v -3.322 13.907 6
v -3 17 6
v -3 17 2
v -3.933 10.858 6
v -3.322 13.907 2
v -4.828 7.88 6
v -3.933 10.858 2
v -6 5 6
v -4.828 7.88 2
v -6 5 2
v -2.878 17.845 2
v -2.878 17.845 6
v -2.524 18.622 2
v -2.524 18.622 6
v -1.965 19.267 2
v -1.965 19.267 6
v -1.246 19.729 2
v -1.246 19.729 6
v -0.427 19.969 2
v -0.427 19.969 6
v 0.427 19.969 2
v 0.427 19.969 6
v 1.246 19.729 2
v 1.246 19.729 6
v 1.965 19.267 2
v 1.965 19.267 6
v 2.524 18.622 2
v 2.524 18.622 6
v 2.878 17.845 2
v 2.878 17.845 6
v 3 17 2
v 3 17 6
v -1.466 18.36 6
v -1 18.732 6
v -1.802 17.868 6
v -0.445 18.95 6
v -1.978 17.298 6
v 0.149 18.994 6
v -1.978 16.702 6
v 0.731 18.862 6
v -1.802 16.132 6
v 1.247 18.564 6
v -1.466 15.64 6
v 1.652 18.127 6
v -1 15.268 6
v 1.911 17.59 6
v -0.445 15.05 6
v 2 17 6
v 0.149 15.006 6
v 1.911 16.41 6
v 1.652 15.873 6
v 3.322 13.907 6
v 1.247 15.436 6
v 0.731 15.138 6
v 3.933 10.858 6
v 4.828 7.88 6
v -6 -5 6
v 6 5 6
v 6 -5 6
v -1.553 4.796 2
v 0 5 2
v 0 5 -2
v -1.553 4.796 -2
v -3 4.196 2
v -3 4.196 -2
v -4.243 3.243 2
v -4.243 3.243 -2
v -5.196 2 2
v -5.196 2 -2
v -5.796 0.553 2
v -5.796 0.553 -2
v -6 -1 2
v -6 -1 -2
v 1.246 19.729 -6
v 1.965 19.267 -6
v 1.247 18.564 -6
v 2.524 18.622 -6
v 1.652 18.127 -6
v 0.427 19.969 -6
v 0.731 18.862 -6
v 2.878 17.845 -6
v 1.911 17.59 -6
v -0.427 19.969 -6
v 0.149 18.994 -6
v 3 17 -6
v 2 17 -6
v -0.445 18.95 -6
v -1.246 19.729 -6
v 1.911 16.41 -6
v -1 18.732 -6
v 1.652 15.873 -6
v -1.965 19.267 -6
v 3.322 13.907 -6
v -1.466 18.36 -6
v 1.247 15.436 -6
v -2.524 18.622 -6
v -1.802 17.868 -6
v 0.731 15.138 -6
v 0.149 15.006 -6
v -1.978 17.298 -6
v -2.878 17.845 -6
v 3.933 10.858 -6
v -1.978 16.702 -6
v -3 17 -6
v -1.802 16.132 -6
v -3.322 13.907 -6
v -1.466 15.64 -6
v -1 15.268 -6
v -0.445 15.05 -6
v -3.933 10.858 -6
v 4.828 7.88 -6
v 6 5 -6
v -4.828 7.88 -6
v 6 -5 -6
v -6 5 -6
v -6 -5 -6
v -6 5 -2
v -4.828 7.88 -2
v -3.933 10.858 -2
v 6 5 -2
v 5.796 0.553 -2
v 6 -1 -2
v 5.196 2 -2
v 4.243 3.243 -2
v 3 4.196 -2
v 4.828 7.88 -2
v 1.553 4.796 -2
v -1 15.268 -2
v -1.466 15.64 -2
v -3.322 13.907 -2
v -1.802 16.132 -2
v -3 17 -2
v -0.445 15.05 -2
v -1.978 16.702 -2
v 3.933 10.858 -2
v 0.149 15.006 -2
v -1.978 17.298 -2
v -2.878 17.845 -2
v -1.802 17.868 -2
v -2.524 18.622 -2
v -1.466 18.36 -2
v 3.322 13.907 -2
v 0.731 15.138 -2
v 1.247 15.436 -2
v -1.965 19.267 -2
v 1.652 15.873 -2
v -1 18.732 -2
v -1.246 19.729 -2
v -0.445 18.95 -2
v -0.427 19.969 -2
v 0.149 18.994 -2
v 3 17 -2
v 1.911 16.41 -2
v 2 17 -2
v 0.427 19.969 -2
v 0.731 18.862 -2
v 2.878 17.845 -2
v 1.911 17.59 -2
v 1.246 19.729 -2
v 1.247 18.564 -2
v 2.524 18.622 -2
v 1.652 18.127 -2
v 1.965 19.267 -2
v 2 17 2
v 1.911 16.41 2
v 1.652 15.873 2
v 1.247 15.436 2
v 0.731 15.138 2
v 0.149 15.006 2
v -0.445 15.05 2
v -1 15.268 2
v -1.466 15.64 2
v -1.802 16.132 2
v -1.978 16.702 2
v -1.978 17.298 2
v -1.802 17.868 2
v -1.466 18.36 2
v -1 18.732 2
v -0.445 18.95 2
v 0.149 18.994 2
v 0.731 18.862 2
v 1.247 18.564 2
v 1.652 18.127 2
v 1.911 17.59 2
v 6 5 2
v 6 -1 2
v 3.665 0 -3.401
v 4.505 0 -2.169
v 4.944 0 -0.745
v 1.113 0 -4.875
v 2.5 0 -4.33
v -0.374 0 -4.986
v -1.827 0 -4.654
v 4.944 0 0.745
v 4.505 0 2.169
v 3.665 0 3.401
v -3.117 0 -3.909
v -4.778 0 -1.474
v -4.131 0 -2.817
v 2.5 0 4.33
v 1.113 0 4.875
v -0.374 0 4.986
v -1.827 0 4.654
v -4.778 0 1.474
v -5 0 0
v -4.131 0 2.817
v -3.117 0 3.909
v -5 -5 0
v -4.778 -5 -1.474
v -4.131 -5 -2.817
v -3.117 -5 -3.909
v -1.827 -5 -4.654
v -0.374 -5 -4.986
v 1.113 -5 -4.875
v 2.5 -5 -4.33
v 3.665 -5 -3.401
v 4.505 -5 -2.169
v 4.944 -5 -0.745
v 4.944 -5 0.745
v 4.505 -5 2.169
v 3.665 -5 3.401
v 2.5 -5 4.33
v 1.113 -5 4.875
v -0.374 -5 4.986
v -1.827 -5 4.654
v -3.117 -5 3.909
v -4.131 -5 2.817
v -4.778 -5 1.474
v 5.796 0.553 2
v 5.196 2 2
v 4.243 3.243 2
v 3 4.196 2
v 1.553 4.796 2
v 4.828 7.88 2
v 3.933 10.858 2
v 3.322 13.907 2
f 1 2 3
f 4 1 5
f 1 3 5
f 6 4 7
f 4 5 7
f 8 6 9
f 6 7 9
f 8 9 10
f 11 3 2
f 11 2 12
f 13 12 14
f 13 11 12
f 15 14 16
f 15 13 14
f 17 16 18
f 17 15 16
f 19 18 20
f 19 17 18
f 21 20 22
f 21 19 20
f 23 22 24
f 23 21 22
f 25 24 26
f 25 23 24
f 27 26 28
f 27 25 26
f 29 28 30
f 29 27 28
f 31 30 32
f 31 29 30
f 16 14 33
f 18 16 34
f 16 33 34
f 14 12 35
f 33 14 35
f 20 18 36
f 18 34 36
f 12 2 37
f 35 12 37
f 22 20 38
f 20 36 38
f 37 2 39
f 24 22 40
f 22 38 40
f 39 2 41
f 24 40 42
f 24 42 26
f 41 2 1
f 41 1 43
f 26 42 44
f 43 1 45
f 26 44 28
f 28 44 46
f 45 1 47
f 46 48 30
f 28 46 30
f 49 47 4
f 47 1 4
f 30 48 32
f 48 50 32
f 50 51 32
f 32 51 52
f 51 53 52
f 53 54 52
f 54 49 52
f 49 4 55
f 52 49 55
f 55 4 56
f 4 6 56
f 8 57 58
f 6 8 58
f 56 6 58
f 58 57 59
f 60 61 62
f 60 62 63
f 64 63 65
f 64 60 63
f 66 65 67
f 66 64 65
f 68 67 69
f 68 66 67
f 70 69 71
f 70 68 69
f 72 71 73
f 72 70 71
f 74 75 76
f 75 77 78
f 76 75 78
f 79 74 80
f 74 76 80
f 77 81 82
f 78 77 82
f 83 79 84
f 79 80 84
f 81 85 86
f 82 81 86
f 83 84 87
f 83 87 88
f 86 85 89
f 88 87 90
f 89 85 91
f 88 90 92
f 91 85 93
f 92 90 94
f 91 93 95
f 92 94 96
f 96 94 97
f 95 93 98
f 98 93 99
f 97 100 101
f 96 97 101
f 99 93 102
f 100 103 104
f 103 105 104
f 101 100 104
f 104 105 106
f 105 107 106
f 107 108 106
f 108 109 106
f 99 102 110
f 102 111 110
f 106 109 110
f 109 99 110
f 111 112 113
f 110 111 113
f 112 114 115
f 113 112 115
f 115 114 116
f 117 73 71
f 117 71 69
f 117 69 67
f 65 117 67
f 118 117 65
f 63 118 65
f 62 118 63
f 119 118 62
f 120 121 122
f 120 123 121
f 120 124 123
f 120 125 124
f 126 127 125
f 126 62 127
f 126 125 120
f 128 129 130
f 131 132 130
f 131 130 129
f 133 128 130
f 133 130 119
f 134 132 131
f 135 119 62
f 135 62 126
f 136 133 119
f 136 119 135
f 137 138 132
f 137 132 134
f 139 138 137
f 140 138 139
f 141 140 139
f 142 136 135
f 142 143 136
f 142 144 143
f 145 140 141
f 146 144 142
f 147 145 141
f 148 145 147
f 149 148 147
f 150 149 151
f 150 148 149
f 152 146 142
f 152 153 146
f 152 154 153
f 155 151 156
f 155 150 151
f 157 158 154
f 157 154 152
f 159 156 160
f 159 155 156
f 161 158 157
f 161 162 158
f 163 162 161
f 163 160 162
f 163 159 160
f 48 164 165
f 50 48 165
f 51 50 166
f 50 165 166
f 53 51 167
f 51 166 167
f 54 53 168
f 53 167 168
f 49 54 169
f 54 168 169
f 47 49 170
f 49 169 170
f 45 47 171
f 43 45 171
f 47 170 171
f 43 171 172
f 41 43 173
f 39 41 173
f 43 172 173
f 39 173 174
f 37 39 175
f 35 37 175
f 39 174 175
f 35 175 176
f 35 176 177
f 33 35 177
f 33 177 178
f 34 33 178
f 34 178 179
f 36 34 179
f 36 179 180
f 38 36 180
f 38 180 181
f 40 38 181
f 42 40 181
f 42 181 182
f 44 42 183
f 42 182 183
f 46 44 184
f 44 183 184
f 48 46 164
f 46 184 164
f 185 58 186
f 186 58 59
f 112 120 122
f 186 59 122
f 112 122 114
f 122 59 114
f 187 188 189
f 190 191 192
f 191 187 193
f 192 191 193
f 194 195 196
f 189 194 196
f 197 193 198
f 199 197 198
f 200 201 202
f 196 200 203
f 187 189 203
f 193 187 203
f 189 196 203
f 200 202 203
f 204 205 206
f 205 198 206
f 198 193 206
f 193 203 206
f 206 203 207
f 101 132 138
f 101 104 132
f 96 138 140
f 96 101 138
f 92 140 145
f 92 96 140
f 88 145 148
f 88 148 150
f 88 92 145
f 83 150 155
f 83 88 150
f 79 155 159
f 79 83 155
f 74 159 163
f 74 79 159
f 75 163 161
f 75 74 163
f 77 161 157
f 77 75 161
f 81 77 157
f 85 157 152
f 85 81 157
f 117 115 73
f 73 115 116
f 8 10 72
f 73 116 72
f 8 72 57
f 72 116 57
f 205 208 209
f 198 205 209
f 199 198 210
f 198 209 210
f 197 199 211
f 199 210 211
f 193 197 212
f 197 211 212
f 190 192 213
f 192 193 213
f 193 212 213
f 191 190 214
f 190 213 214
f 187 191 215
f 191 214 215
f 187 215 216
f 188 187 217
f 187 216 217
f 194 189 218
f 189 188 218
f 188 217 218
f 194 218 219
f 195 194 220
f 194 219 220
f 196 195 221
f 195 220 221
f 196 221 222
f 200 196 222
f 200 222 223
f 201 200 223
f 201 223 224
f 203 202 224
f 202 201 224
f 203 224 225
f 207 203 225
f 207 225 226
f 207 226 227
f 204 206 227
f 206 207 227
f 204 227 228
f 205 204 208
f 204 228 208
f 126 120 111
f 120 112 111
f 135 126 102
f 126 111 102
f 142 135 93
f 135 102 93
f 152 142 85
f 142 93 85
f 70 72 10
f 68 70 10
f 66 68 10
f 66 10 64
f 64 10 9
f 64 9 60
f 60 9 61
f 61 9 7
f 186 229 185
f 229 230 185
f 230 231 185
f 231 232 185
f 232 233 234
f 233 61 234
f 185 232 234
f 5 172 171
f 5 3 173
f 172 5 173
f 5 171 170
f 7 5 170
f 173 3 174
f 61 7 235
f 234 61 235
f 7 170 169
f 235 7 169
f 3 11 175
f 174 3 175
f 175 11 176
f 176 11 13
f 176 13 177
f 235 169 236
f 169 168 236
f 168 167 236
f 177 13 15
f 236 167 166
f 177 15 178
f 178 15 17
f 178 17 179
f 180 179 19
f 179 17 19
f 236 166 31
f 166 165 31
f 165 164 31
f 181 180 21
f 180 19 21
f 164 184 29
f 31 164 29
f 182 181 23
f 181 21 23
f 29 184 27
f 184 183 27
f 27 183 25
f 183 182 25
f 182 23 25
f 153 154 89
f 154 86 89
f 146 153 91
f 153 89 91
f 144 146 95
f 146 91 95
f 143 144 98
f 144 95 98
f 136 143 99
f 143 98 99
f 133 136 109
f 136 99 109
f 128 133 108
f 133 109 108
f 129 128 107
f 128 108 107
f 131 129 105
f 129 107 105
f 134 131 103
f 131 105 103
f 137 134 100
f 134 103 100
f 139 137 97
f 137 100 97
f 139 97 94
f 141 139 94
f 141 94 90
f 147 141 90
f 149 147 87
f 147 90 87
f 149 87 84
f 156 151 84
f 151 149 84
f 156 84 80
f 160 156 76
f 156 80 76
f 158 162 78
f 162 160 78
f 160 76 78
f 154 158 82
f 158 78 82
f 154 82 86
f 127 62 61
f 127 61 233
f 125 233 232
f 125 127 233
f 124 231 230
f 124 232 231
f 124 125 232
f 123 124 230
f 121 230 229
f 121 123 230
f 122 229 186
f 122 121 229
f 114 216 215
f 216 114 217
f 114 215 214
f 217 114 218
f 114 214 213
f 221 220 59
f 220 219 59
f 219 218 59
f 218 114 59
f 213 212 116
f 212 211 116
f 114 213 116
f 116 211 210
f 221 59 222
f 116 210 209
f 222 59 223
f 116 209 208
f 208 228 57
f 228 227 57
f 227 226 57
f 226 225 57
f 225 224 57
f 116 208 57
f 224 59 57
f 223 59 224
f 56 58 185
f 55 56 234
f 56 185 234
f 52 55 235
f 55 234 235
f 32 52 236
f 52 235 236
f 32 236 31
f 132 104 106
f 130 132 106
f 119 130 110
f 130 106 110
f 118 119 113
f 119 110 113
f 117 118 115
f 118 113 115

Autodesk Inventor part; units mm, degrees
ref_plane "YZ Plane" through (0, 0, 0) normal (1, 0, 0) x (0, 1, 0)
sketch "Szkic3" plane through (0, 0, 0) normal (0, 1, 0) x (-1, 0, 0)
  circle A0 centre (0, 0) radius 5
  line L0 (-6, -6) -> (6, -6)
  line L1 (6, -6) -> (6, 6)
  line L2 (6, 6) -> (-6, 6)
  line L3 (-6, 6) -> (-6, -6)
  line L4 (-6, -6) -> (6, 6) construction
  line L5 (6, -6) -> (-6, 6) construction
  dimension "d12" = 10
  dimension "d15" = 12
  dimension "d16" = 12
extrude "Wyciągnięcie proste3" add sketch "Szkic3" along normal mid plane 10
extrude "Wyciągnięcie proste4" add sketch "Szkic3" along normal blind 5 contours A0
ref_plane "Płaszczyzna konstrukcyjna2" through (-6, 5, 0) normal (0, 0, 1) x (1, 0, 0)
sketch "Szkic7" plane through (-6, 5, 0) normal (0, 0, 1) x (1, 0, 0)
  line L0 (0, -10) -> (0, 0) projected
  line L1 (0, 0) -> (12, 0)
  line L2 (12, 0) -> (6, 0)
  line L3 (6, 0) -> (6, 12) construction
  circle A0 centre (6, 12) radius 2
  line L4 (6, 12) -> (8, 12) construction
  line L5 (8, 12) -> (9, 12)
  line L6 (6, 12) -> (6, 14) construction
  line L7 (6, 14) -> (6, 15)
  arc A1 (9, 12) -> (6, 15) centre (6, 12) ccw
  arc A2 (9, 12) -> (12, 0) centre (41.9474, 13.8619) ccw
  line L8 (4, 12) -> (3, 12)
  arc A3 (6, 15) -> (3, 12) centre (6, 12) ccw
  arc A4 (0, 0) -> (3, 12) centre (-29.9474, 13.8619) ccw
  point P0 (6, -5)
  dimension "d61" = 12
  dimension "d62" = 4
  dimension "d63" = 1
  dimension "d64" = 2
  dimension "d65" = 1
  dimension "d66" = 3
  dimension "d67" = 33
  dimension "d68" = 1
  dimension "d69" = 2
  dimension "d70" = 3
  dimension "d71" = 33
extrude "Wyciągnięcie proste7" add sketch "Szkic7" along normal mid plane 12 contours A4 L8 A0 L5 A2 L1 | A3 L7 A0 L8 | A1 L5 A0 L7
ref_plane "Płaszczyzna konstrukcyjna3" through (-6, -5, 0) normal (0, 0, 1) x (1, 0, 0)
sketch "Szkic9" plane through (-6, -5, 0) normal (0, 0, 1) x (1, 0, 0)
  arc A0 (9, 22) -> (12, 10) centre (41.9474, 23.8619) ccw projected
  line L0 (0, 34) -> (12, 34)
  line L1 (12, 34) -> (12, 10)
  line L2 (12, 10) -> (0, 10)
  line L3 (0, 10) -> (0, 34)
  circle A1 centre (6, 22) radius 2 projected
  line L4 (0, 34) -> (12, 10) construction
  line L5 (12, 34) -> (0, 10) construction
  point P0 (6, 5)
extrude "Wyciągnięcie proste9" cut sketch "Szkic9" along normal mid plane 4
fillet "Zaokrąglenie7" radius 6 2 edges at (6, 5, 0) (-6, 5, 0)
properties part number "Connector_hollow"
